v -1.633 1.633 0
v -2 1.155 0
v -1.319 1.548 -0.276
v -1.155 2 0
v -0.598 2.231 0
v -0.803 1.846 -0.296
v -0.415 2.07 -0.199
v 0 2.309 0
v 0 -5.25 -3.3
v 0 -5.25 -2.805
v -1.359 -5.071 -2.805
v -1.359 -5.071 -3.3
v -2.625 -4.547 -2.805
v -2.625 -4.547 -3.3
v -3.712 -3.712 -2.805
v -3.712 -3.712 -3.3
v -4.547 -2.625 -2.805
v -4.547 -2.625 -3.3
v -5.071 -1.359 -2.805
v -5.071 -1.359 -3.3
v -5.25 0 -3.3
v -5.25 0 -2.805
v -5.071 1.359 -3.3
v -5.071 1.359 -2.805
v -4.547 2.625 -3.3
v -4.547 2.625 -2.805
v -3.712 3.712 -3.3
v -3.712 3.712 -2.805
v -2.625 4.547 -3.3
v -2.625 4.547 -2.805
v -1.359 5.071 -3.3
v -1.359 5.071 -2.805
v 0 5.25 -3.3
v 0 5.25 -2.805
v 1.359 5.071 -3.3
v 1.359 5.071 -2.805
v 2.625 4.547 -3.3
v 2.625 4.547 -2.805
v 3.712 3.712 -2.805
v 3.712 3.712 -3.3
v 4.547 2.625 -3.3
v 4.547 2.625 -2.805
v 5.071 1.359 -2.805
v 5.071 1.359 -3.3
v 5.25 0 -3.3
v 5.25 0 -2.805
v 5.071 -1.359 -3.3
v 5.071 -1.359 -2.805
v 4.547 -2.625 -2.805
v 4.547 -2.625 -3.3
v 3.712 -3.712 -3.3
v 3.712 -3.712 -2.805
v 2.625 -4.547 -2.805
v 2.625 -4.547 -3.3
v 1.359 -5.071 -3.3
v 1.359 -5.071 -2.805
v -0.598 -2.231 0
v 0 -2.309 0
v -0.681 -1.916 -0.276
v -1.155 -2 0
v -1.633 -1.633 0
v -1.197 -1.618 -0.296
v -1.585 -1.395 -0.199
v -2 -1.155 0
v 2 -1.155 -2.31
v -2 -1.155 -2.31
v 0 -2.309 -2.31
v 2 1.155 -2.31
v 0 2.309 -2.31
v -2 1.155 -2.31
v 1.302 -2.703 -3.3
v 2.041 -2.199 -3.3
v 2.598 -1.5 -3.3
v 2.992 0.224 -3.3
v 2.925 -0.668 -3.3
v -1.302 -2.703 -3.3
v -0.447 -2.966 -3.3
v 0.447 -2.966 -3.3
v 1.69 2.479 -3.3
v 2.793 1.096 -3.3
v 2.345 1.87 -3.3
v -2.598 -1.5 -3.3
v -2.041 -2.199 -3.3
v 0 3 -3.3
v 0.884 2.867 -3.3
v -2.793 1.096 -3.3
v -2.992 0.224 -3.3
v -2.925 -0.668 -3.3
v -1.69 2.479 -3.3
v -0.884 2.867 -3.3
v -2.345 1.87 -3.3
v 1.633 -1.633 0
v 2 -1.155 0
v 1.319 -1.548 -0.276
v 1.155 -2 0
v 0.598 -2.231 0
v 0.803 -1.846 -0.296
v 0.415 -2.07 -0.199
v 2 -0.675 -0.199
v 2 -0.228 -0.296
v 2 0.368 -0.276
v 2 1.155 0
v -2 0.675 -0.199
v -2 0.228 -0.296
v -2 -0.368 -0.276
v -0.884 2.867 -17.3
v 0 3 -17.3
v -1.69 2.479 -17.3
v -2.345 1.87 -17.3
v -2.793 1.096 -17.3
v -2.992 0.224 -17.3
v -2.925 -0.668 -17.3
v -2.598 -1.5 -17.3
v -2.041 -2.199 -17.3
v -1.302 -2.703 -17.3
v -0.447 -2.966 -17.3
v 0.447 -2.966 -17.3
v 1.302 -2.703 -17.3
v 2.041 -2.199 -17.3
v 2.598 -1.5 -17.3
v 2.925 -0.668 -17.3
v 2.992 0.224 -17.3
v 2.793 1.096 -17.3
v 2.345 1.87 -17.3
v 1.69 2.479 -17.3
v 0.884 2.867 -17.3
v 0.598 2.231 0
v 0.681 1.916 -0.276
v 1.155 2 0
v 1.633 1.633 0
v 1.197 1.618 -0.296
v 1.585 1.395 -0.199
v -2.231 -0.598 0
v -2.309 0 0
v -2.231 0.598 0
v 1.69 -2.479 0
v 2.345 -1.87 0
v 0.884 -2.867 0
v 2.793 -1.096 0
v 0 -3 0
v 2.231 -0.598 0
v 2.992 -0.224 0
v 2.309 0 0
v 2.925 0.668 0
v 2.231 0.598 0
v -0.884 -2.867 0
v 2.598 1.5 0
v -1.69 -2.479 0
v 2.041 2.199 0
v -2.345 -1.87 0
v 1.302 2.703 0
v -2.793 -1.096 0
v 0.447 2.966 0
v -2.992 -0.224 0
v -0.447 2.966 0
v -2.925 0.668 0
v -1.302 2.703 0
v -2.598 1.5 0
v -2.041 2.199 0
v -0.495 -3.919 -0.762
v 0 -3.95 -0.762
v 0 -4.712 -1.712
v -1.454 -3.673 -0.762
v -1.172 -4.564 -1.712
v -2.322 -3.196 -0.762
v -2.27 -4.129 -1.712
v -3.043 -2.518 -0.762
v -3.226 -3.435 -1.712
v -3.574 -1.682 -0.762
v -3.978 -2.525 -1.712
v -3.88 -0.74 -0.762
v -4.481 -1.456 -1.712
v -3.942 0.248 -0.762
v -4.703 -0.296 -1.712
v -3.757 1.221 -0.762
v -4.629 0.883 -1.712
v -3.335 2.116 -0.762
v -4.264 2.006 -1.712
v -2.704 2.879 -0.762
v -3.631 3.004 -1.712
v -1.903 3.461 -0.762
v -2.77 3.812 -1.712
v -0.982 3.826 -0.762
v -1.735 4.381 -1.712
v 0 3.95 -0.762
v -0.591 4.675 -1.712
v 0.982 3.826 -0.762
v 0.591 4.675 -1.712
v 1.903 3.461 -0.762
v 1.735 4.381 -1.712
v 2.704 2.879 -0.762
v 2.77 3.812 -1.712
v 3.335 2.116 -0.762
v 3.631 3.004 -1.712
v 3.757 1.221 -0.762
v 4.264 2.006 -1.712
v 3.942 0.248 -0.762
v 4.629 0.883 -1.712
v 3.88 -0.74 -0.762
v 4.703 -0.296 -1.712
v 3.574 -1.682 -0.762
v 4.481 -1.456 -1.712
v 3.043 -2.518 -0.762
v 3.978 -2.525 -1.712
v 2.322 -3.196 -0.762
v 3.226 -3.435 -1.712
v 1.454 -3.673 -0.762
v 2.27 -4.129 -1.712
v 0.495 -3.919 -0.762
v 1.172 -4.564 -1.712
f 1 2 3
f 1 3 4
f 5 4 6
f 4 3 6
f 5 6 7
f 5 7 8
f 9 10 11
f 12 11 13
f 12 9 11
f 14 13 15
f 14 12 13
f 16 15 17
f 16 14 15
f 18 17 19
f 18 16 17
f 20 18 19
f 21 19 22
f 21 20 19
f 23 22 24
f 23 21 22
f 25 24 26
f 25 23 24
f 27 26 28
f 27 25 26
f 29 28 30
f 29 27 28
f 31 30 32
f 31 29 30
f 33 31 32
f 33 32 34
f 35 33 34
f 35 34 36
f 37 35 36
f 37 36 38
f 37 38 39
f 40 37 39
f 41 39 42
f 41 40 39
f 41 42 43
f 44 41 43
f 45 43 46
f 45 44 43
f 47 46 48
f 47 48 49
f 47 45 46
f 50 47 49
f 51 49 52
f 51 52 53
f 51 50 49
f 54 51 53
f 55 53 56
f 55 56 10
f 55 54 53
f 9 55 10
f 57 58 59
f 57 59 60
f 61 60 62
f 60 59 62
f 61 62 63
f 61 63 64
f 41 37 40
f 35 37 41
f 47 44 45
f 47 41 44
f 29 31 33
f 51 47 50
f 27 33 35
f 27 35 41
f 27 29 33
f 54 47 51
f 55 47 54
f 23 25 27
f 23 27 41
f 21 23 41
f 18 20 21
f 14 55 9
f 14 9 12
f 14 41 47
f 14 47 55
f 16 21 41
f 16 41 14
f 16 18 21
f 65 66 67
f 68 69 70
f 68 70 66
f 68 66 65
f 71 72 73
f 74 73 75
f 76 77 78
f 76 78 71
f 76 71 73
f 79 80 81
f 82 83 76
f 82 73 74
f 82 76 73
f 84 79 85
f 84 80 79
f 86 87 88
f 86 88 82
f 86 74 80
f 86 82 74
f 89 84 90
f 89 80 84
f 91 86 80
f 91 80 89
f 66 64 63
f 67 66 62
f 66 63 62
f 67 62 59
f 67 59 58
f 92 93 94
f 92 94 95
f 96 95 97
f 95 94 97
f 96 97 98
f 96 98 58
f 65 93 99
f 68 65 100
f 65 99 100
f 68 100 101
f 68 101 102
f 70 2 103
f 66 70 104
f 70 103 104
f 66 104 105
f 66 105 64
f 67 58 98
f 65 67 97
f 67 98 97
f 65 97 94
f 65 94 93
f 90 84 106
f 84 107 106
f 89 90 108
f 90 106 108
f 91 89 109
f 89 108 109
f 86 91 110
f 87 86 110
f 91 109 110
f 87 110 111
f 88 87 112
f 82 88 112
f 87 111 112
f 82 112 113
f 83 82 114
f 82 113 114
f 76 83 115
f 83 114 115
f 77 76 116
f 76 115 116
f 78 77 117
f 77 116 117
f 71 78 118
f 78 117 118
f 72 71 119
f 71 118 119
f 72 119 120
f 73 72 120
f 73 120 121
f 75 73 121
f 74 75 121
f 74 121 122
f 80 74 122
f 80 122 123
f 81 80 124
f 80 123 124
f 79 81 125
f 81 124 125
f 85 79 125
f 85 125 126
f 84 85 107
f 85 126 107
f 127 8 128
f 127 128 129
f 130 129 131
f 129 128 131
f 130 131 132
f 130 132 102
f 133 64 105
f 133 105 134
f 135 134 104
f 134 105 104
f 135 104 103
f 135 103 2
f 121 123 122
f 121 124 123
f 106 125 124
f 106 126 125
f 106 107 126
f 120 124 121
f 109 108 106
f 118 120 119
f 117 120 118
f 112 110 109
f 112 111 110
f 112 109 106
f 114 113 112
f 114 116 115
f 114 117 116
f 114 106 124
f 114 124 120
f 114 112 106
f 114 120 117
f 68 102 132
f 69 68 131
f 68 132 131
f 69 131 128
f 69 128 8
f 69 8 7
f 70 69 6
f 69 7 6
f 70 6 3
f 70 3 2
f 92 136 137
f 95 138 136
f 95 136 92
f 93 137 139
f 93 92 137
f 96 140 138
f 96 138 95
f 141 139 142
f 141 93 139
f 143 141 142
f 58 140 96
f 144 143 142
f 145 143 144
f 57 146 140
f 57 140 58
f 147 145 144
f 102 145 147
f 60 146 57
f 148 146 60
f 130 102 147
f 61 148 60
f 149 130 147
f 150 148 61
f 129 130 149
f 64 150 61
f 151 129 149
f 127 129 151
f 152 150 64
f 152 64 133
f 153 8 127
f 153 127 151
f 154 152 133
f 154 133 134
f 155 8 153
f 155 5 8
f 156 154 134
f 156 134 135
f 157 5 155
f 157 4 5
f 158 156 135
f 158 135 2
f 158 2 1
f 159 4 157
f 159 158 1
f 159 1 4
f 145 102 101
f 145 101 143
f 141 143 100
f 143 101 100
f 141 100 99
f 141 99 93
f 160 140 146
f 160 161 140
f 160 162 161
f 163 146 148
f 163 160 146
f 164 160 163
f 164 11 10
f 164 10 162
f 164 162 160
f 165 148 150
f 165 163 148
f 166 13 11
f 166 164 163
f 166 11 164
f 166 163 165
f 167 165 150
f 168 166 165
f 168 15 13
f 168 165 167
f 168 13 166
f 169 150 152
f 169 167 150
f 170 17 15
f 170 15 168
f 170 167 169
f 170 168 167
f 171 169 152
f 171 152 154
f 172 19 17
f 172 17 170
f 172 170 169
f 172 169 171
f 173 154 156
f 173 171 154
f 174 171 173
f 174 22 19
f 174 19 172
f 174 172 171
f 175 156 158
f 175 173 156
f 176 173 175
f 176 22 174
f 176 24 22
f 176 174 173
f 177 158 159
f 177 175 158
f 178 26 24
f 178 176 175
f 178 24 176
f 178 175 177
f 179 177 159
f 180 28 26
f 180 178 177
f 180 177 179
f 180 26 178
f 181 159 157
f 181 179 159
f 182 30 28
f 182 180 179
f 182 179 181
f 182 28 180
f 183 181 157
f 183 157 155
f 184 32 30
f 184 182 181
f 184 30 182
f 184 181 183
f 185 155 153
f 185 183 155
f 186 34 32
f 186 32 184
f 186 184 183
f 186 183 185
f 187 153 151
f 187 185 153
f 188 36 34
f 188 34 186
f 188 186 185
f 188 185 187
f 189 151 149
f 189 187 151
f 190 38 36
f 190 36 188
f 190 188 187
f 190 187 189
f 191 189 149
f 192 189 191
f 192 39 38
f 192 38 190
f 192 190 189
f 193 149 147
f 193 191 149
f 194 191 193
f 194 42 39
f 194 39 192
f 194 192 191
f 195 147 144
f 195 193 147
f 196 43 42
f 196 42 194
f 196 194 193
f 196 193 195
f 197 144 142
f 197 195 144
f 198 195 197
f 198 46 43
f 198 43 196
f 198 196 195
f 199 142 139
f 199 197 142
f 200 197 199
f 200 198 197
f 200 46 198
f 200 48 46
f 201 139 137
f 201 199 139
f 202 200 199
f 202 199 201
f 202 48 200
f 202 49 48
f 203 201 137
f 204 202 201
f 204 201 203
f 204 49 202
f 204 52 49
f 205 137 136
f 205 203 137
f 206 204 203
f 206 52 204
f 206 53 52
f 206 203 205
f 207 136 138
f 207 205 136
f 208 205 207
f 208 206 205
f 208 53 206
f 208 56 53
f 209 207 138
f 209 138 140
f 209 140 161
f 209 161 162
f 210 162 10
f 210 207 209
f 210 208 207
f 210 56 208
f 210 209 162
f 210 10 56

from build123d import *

# Parameters (mm, degrees)
SKETCH1_W              = 14
SKETCH1_H              = 3
CUT_EXTRUDE2_DEPTH     = 2.31
SPLIT1_SURFACE_1_BACK  = 23.799
SPLIT1_SURFACE_1_DEPTH = 47.598
SPLIT1_SURFACE_2_BACK  = 23.799
SPLIT1_SURFACE_2_DEPTH = 47.598


with BuildPart() as part:
    # Sketch1 → Revolve1 (revolve)
    with BuildSketch(Plane(origin=(0, 0, 0), x_dir=(0, 0, -1), z_dir=(1, 0, 0))):
        with Locations((10.3, 1.5)):
            Rectangle(SKETCH1_W, SKETCH1_H)
    revolve(axis=Axis((0, 0, -17.3), (0, 0, 1)))

    # Sketch7 → Revolve2 (revolve)
    with BuildSketch(Plane(origin=(0, 0, 0), x_dir=(0, 0, -1), z_dir=(1, 0, 0))):
        with BuildLine():
            Line((2.805, 5.25), (3.3, 5.25))
            Line((3.3, 5.25), (3.3, 0))
            Line((3.3, 0), (0, 0))
            Line((0, 0), (0, 3))
            ThreePointArc((0, 3), (1.216479019, 4.356906156), (2.805, 5.25))
        make_face()
    revolve(axis=Axis((0, 0, 0), (0, 0, -1)))

    # Sketch5 → Cut-Extrude2 (cut)
    with BuildSketch(Plane.XY):
        Polygon((2, -1.154700538), (2, 1.154700538), (0, 2.309401077), (-2, 1.154700538), (-2, -1.154700538), (0, -2.309401077), align=None)
    extrude(amount=-CUT_EXTRUDE2_DEPTH, mode=Mode.SUBTRACT)

    # Cut-Extrude3 cone 1 section (through the dimple's axis) → Cut-Extrude3 (revolve, cut)
    with BuildSketch(Plane(origin=(0, 0, 0), x_dir=(0, -1, 0), z_dir=(1, 0, 0))):
        Polygon((0, 0), (2.309401077, 0), (0, 2.309401077), align=None)
    revolve(axis=Axis((0, 0, 0), (0, 0, -1)), mode=Mode.SUBTRACT)


with BuildPart() as body_2:
    # Split1: the piece behind the surface
    add(part.part)
    # Split1 surface: a surface, the sketch's curves swept straight by 47.598 mm
    with BuildLine(Plane(origin=(0, 0, 0), x_dir=(0, 0, -1), z_dir=(1, 0, 0)).offset(-SPLIT1_SURFACE_1_BACK), mode=Mode.PRIVATE) as split1_surface_1_path:
        Line((3.3, -5.25), (3.3, 5.25))
    split1_surface_1 = Shell.extrude(split1_surface_1_path.wire(), (1 * SPLIT1_SURFACE_1_DEPTH, 0 * SPLIT1_SURFACE_1_DEPTH, 0 * SPLIT1_SURFACE_1_DEPTH))
    split(bisect_by=split1_surface_1, keep=Keep.BOTTOM)


with BuildPart() as part_1:
    add(part.part)

    # Split1: split by a surface, the side it looks to stays
    # Split1 surface: a surface, the sketch's curves swept straight by 47.598 mm
    with BuildLine(Plane(origin=(0, 0, 0), x_dir=(0, 0, -1), z_dir=(1, 0, 0)).offset(-SPLIT1_SURFACE_2_BACK), mode=Mode.PRIVATE) as split1_surface_2_path:
        Line((3.3, -5.25), (3.3, 5.25))
    split1_surface_2 = Shell.extrude(split1_surface_2_path.wire(), (1 * SPLIT1_SURFACE_2_DEPTH, 0 * SPLIT1_SURFACE_2_DEPTH, 0 * SPLIT1_SURFACE_2_DEPTH))
    split(bisect_by=split1_surface_2, keep=Keep.TOP)


solid = Compound([body_2.part, part_1.part])
